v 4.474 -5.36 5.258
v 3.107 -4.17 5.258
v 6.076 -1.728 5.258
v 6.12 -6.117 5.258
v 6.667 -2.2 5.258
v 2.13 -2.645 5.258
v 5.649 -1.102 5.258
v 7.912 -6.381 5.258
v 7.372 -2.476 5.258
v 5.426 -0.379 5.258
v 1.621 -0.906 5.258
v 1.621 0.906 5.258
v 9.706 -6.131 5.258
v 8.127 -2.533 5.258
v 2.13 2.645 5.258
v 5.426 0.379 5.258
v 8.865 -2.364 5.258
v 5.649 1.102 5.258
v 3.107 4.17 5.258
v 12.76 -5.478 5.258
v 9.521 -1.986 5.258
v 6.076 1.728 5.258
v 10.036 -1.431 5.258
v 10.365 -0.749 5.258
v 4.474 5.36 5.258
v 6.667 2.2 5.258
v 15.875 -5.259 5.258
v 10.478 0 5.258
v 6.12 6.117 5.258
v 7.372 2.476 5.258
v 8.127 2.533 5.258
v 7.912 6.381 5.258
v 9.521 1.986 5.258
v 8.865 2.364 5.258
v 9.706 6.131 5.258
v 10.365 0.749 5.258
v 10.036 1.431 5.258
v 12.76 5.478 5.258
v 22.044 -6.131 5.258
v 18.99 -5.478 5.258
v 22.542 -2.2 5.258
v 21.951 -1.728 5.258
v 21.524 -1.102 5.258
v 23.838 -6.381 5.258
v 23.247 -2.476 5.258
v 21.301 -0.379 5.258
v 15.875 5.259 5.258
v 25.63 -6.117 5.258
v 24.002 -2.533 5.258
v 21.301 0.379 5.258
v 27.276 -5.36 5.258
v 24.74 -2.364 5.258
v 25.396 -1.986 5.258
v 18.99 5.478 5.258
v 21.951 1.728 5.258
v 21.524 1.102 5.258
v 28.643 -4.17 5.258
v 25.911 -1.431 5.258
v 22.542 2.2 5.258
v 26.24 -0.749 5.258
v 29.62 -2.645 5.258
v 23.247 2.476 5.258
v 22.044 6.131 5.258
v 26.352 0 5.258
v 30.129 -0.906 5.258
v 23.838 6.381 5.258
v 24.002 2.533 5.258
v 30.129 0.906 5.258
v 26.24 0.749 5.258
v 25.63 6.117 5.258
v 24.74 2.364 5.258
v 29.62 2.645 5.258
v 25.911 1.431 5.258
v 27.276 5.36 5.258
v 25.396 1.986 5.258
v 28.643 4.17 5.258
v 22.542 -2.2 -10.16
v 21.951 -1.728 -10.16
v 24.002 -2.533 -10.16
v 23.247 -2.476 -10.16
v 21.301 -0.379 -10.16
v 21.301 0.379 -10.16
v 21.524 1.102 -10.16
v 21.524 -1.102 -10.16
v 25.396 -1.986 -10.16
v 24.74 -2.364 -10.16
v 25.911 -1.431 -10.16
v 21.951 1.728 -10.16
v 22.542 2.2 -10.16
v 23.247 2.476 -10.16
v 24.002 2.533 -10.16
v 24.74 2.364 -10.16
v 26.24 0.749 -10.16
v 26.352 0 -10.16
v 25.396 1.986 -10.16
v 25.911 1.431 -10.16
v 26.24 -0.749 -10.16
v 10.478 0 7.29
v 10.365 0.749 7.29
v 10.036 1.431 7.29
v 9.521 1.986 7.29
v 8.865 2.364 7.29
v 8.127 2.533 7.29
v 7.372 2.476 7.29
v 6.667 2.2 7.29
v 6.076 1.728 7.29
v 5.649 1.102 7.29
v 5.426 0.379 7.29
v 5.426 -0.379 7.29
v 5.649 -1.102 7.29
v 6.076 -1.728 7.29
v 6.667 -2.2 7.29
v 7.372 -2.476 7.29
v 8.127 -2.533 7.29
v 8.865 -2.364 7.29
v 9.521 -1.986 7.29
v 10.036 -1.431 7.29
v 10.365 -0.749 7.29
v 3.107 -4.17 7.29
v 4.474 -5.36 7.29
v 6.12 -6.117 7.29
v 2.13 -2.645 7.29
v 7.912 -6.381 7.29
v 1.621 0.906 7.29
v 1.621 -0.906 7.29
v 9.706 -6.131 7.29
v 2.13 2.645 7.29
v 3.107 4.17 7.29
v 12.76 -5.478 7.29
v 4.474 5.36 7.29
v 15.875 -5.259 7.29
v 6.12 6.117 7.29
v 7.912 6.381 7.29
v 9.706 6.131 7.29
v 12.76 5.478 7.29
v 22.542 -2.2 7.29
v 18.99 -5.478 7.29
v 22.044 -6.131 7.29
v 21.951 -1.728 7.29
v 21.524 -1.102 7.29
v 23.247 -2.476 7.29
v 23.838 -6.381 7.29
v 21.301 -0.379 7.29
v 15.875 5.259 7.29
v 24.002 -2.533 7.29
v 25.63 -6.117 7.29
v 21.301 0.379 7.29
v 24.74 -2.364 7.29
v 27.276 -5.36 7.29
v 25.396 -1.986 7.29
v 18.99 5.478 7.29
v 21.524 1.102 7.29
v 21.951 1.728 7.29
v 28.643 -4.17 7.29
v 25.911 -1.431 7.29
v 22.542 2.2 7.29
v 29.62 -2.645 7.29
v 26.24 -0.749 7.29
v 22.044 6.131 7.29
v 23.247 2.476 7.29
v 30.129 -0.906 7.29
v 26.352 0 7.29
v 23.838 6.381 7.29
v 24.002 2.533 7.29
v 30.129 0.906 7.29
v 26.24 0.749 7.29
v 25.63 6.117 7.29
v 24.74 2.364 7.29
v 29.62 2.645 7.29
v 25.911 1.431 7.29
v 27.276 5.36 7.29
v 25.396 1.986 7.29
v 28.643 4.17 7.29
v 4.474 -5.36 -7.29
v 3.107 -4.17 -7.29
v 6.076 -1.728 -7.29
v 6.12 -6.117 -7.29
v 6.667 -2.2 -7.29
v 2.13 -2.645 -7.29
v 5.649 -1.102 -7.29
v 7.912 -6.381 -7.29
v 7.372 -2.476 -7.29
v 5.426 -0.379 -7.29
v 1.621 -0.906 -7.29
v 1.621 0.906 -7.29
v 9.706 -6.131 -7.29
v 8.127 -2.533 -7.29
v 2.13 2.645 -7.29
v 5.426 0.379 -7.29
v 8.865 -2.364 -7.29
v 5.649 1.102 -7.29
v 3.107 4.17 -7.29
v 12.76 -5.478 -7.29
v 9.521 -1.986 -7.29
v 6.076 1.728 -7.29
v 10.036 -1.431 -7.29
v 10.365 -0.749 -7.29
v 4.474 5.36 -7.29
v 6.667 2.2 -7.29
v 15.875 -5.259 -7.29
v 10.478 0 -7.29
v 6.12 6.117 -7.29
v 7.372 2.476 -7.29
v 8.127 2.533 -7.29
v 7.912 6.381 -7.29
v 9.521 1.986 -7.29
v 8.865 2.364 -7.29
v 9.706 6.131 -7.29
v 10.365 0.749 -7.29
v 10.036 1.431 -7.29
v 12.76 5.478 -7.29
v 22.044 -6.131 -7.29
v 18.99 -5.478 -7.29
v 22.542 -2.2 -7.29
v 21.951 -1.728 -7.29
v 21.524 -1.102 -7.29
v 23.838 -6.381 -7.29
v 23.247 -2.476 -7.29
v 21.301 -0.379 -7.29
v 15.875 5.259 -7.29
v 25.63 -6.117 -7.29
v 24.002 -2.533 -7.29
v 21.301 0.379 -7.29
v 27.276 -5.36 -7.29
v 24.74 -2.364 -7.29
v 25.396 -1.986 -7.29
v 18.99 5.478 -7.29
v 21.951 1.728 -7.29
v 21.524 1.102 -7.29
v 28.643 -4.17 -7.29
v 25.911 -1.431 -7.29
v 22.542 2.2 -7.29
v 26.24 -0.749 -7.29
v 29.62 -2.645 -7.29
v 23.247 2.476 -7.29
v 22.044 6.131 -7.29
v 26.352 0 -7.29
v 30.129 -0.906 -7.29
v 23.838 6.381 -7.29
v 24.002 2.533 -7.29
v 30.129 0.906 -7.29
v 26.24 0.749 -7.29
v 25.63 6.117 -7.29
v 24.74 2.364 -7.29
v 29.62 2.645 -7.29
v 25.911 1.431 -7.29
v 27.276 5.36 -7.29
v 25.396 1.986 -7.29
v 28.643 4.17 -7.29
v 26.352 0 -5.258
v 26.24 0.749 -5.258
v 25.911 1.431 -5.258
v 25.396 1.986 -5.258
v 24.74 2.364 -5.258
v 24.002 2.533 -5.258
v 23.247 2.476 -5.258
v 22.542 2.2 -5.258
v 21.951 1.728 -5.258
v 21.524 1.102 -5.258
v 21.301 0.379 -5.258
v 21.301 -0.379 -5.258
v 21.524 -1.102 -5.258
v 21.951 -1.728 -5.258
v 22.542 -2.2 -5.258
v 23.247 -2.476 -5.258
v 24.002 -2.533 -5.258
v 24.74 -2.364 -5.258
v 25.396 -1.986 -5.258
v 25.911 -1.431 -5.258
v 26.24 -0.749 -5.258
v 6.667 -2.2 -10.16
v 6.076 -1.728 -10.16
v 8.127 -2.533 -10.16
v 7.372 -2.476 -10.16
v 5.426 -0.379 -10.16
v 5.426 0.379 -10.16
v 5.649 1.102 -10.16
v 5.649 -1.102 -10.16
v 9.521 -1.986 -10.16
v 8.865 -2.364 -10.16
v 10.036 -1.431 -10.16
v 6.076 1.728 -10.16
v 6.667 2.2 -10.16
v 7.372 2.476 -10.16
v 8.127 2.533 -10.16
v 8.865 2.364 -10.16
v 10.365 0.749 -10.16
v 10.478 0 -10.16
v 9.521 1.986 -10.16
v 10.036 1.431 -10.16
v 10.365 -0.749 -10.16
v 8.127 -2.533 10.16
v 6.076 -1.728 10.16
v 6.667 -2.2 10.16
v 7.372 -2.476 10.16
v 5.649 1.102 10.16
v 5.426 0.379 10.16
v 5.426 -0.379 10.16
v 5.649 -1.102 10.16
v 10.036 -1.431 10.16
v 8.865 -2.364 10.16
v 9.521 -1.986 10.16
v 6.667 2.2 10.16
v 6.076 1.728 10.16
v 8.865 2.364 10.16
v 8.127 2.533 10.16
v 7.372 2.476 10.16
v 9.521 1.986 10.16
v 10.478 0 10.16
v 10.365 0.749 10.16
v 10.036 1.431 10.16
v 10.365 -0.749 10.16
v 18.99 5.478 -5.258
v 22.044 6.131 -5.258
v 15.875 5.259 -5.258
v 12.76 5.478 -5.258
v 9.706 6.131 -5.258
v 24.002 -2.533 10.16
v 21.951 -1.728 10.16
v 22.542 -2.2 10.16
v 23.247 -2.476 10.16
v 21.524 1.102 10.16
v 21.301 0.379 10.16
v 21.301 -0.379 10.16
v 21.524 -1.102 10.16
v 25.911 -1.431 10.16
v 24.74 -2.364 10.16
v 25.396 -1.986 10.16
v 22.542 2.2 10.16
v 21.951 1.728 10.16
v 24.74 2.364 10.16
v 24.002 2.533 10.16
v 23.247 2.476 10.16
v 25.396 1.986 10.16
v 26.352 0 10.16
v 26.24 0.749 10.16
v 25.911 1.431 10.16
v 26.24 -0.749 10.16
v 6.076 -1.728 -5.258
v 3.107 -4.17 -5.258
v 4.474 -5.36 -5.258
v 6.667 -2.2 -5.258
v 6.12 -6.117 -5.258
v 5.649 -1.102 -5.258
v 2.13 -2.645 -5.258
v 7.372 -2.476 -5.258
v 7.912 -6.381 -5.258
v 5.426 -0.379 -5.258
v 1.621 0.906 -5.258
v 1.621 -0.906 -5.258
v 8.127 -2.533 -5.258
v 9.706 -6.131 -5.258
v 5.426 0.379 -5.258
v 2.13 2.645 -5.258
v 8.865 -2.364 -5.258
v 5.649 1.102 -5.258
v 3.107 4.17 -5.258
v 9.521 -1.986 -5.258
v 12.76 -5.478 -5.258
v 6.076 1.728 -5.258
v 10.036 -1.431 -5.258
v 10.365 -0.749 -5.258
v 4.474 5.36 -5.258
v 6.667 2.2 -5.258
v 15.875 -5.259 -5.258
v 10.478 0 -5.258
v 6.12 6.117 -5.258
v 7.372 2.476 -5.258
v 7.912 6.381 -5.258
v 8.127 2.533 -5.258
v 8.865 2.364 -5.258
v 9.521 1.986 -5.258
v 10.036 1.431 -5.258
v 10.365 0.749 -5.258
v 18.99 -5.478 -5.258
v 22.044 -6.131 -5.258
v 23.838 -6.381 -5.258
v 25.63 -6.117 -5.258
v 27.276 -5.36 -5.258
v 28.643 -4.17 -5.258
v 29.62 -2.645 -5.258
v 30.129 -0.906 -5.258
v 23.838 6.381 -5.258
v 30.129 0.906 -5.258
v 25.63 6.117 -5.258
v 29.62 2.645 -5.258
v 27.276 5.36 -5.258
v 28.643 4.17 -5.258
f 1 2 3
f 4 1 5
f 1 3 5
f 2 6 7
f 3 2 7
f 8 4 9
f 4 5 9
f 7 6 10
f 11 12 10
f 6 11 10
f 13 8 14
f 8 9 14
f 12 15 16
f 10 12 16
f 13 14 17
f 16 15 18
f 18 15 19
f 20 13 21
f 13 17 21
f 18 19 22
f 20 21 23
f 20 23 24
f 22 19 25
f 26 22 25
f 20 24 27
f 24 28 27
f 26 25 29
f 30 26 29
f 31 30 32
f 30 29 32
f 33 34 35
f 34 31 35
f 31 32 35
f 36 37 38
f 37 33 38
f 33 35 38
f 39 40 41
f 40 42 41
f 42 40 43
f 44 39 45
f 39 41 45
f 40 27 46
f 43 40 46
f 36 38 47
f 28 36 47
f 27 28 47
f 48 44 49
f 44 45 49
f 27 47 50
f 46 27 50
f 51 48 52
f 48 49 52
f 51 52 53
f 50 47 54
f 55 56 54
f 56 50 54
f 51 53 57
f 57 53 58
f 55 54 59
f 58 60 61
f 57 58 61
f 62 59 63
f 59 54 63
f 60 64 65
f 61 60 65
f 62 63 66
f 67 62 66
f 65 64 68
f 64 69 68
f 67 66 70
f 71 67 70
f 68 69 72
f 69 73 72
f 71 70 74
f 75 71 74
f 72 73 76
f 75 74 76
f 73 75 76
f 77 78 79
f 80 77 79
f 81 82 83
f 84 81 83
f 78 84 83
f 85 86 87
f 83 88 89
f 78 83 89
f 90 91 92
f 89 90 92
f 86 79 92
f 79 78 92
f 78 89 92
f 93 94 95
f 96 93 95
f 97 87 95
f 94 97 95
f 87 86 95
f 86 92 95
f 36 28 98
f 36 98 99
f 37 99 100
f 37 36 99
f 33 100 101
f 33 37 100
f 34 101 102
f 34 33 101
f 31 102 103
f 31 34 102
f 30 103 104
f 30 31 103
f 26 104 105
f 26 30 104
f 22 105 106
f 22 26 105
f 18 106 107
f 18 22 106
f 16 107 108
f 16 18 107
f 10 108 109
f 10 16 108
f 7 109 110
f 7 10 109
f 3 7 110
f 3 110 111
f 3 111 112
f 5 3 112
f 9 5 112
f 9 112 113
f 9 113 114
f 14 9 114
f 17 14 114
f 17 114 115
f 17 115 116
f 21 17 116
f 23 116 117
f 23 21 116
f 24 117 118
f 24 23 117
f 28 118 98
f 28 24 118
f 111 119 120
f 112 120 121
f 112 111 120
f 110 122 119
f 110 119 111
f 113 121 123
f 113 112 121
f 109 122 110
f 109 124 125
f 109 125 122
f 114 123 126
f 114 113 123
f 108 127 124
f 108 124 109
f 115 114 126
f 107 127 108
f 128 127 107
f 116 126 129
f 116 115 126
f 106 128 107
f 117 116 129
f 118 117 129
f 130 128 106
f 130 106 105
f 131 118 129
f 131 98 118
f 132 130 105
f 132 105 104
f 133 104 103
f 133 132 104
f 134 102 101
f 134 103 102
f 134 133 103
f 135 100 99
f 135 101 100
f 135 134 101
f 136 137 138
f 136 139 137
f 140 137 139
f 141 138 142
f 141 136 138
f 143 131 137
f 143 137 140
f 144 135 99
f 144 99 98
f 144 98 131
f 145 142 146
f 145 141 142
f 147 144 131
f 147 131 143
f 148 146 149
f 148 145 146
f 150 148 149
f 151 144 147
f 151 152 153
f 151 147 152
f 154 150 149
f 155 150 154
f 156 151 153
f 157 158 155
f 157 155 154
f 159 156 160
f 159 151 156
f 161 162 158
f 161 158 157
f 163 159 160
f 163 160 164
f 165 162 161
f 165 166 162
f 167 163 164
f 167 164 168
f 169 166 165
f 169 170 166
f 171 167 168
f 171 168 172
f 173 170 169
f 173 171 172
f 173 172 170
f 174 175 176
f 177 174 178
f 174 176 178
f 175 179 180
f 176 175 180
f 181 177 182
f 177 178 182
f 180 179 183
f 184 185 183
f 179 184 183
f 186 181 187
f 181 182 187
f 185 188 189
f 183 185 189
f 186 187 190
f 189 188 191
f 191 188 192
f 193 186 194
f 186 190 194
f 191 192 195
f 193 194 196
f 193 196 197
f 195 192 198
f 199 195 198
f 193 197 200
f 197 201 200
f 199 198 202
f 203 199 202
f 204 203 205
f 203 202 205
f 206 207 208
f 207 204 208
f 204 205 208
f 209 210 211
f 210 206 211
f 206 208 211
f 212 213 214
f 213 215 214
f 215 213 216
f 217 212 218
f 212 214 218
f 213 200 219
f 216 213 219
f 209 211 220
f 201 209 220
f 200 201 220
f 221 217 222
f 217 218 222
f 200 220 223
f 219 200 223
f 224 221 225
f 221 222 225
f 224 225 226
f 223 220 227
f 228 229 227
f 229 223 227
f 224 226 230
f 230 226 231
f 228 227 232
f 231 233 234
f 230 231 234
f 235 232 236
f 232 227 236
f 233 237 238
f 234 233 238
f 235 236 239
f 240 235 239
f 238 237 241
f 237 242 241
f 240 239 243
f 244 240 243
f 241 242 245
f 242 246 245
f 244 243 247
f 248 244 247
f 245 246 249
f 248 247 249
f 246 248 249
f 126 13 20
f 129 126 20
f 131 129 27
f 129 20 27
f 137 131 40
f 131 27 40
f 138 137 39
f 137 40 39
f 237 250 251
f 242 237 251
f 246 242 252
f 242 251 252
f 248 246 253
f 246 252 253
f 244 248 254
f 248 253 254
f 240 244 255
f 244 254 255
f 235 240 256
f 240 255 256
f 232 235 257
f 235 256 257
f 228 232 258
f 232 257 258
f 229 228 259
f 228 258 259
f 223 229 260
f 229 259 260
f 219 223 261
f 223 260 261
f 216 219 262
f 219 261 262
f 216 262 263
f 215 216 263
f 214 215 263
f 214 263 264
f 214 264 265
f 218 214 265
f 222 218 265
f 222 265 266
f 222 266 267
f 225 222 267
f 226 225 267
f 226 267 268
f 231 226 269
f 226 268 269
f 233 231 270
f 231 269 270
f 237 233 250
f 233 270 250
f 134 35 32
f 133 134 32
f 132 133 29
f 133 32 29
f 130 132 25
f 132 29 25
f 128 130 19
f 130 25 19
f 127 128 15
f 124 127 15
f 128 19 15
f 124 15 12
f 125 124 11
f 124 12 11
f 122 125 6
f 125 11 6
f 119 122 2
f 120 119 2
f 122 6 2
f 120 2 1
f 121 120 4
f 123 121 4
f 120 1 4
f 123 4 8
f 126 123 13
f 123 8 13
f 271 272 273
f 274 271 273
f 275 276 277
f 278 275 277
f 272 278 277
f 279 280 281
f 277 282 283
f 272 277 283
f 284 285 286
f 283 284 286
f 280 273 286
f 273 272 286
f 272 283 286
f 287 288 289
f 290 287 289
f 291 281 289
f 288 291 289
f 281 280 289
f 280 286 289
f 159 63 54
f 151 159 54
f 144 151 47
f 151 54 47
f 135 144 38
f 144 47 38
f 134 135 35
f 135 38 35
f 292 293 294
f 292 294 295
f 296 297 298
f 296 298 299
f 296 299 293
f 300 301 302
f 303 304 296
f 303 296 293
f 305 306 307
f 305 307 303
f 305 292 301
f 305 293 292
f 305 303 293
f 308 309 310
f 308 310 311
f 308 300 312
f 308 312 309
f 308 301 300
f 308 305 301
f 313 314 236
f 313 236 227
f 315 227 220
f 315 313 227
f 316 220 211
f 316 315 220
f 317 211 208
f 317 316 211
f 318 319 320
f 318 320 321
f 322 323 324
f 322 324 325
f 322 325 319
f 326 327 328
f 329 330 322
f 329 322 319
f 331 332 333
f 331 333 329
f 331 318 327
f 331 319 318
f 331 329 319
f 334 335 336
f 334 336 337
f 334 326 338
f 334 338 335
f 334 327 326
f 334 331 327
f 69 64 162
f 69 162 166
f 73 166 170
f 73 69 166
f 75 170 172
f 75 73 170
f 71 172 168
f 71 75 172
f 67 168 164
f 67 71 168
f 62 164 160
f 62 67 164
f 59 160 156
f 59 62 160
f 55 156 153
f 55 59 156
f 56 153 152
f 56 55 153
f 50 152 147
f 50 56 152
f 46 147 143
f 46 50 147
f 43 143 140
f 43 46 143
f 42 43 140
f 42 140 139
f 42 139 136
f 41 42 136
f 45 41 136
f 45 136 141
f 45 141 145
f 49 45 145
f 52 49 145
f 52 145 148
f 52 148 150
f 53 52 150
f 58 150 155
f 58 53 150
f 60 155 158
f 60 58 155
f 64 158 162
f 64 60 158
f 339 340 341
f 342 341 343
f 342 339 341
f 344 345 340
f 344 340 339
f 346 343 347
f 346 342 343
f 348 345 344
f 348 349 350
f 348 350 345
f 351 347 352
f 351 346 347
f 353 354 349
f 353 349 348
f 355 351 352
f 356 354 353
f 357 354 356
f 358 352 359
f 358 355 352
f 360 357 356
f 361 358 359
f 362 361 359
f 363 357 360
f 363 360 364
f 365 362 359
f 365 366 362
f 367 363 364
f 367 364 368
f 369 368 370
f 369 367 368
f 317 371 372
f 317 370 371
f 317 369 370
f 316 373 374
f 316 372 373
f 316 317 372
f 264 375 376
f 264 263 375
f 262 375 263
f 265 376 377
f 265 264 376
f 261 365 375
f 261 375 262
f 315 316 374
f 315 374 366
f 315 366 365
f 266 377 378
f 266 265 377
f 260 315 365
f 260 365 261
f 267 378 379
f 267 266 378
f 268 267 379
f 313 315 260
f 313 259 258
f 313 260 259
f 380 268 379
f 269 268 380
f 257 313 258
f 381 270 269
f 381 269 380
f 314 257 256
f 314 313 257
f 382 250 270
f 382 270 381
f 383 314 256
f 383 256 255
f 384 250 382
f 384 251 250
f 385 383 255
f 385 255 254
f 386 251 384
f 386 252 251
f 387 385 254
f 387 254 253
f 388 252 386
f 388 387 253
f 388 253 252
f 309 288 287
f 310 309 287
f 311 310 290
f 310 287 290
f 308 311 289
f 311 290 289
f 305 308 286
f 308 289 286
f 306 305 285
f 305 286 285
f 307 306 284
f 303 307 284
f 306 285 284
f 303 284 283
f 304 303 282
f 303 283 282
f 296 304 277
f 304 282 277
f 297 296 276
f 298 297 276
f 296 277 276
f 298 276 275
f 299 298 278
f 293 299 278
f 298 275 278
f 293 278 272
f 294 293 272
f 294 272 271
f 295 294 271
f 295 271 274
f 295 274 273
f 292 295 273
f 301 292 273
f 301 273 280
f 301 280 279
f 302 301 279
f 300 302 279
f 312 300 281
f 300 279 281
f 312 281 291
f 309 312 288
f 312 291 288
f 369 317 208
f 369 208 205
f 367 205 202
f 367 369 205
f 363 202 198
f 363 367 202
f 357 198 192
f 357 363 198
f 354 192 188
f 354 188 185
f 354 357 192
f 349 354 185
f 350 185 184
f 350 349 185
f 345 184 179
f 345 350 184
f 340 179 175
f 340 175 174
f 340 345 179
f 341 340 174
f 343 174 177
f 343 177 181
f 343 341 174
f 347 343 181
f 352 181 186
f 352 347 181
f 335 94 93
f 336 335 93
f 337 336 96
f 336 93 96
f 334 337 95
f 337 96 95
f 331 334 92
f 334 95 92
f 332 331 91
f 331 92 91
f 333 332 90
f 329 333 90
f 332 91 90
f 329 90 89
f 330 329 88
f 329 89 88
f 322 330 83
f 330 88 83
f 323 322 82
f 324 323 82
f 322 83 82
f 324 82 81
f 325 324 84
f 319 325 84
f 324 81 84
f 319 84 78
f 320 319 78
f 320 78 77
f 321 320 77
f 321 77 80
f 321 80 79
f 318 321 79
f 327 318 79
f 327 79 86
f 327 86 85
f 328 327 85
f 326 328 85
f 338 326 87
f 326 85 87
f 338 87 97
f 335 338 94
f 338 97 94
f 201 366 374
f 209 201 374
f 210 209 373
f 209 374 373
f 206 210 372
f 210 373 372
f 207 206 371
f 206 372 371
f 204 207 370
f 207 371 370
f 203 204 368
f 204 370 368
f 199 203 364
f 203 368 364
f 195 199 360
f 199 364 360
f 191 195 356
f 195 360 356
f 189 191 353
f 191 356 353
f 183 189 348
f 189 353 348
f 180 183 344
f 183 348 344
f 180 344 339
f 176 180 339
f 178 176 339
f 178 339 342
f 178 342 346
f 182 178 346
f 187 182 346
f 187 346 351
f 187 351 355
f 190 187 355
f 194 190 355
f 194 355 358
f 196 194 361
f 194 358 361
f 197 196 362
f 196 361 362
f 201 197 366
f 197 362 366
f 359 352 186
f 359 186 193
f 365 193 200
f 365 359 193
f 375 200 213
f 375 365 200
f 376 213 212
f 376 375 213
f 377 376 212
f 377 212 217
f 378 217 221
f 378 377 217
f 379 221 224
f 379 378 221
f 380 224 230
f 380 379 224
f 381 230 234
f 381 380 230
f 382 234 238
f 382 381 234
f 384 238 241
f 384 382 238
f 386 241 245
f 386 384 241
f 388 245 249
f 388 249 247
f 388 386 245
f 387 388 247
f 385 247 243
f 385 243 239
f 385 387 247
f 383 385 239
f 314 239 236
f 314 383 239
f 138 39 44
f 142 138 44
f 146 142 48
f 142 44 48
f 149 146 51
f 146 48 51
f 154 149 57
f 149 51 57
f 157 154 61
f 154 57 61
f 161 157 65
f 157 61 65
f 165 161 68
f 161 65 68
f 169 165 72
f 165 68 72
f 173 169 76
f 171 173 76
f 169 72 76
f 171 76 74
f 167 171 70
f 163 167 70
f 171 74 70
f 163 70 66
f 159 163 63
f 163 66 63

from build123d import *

# Parameters (mm, degrees)
SKETCH4_R                  = 5.08
SKETCH4_R_2                = 2.5654
BOSS_EXTRUDE1_DEPTH        = 3.175
BOSS_EXTRUDE1_2_DEPTH      = 3.175
SKETCH5_R                  = 2.54
BOSS_EXTRUDE2_DEPTH        = 2.032
LPATTERN1_COUNT            = 2
LPATTERN1_PITCH            = 15.875
SKETCH7_R                  = 2.54
BOSS_EXTRUDE3_DEPTH        = 2.032
BOSS_EXTRUDE4_DEPTH        = 10.16
BOSS_EXTRUDE4_DEPTH_BACK   = 10.16
SKETCH8_R                  = 2.54
BOSS_EXTRUDE4_2_DEPTH      = 10.16
BOSS_EXTRUDE4_2_DEPTH_BACK = 10.16


with BuildPart() as part:
    # Sketch4 → Boss-Extrude1 (new, symmetric)
    with BuildSketch(Plane.XY):
        with Locations((-7.9375, 0)):
            Circle(SKETCH4_R)
        with Locations((-7.9375, 0)):
            Circle(SKETCH4_R_2, mode=Mode.SUBTRACT)
    extrude(amount=BOSS_EXTRUDE1_DEPTH, both=True)


with BuildPart() as body_2:
    # Sketch4 → Boss-Extrude1 2 (new, symmetric)
    with BuildSketch(Plane.XY):
        with Locations((7.9375, 0)):
            Circle(SKETCH4_R)
        with Locations((7.9375, 0)):
            Circle(SKETCH4_R_2, mode=Mode.SUBTRACT)
    extrude(amount=BOSS_EXTRUDE1_2_DEPTH, both=True)


with BuildPart() as body_3:
    # Sketch5 → Boss-Extrude2 (new body)
    with BuildSketch(Plane.XY.offset(3.175)):
        with BuildLine():
            ThreePointArc((-5.986592041, 6.984347573), (-15.1892, 0), (-5.986592041, -6.984347573))
            ThreePointArc((-5.986592041, -6.984347573), (0, -6.163945), (5.986592041, -6.984347573))
            ThreePointArc((5.986592041, -6.984347573), (15.1892, 0), (5.986592041, 6.984347573))
            ThreePointArc((5.986592041, 6.984347573), (0, 6.163945), (-5.986592041, 6.984347573))
        make_face()
        with Locations((-7.9375, 0)):
            Circle(SKETCH5_R, mode=Mode.SUBTRACT)
        with Locations((7.9375, 0)):
            Circle(SKETCH5_R, mode=Mode.SUBTRACT)
    extrude(amount=BOSS_EXTRUDE2_DEPTH)


with BuildPart() as lpattern1_1:
    # LPattern1: pattern copy
    add(body_2.part.moved(Location(Vector(1, 0, 0) * (1 * LPATTERN1_PITCH))))


with BuildPart() as body_5:
    # Sketch7 → Boss-Extrude3 (new body)
    with BuildSketch(Plane.XY.offset(-5.2578)):
        with BuildLine():
            ThreePointArc((9.706473173, 6.131412978), (1.556004, 0), (9.706473173, -6.131412978))
            ThreePointArc((9.706473173, -6.131412978), (15.875, -5.259356889), (22.043526827, -6.131412978))
            ThreePointArc((22.043526827, -6.131412978), (30.193996, 0), (22.043526827, 6.131412978))
            ThreePointArc((22.043526827, 6.131412978), (15.875, 5.259356889), (9.706473173, 6.131412978))
        make_face()
        with Locations((7.9375, 0)):
            Circle(SKETCH7_R, mode=Mode.SUBTRACT)
        with Locations((23.8125, 0)):
            Circle(SKETCH7_R, mode=Mode.SUBTRACT)
    extrude(amount=-BOSS_EXTRUDE3_DEPTH)


with BuildPart() as body_6:
    # Mirror1: mirrored copy
    add(body_3.part.mirror(Plane.XY))


with BuildPart() as body_7:
    # Mirror1 2: mirrored copy
    add(body_5.part.mirror(Plane.XY))


with BuildPart() as body_8:
    # Sketch8 → Boss-Extrude4 (new, two sides: drawn at the far end of the back side and taken through both)
    with BuildSketch(Plane.XY.offset(-BOSS_EXTRUDE4_DEPTH_BACK)):
        with Locations((7.9375, 0)):
            Circle(SKETCH8_R)
    extrude(amount=BOSS_EXTRUDE4_DEPTH + BOSS_EXTRUDE4_DEPTH_BACK)


with BuildPart() as body_9:
    # Sketch8 → Boss-Extrude4 2 (new, two sides: drawn at the far end of the back side and taken through both)
    with BuildSketch(Plane.XY.offset(-BOSS_EXTRUDE4_2_DEPTH_BACK)):
        with Locations((23.8125, 0)):
            Circle(SKETCH8_R)
    extrude(amount=BOSS_EXTRUDE4_2_DEPTH + BOSS_EXTRUDE4_2_DEPTH_BACK)


solid = Compound([body_5.part, body_7.part, body_8.part, body_9.part])
